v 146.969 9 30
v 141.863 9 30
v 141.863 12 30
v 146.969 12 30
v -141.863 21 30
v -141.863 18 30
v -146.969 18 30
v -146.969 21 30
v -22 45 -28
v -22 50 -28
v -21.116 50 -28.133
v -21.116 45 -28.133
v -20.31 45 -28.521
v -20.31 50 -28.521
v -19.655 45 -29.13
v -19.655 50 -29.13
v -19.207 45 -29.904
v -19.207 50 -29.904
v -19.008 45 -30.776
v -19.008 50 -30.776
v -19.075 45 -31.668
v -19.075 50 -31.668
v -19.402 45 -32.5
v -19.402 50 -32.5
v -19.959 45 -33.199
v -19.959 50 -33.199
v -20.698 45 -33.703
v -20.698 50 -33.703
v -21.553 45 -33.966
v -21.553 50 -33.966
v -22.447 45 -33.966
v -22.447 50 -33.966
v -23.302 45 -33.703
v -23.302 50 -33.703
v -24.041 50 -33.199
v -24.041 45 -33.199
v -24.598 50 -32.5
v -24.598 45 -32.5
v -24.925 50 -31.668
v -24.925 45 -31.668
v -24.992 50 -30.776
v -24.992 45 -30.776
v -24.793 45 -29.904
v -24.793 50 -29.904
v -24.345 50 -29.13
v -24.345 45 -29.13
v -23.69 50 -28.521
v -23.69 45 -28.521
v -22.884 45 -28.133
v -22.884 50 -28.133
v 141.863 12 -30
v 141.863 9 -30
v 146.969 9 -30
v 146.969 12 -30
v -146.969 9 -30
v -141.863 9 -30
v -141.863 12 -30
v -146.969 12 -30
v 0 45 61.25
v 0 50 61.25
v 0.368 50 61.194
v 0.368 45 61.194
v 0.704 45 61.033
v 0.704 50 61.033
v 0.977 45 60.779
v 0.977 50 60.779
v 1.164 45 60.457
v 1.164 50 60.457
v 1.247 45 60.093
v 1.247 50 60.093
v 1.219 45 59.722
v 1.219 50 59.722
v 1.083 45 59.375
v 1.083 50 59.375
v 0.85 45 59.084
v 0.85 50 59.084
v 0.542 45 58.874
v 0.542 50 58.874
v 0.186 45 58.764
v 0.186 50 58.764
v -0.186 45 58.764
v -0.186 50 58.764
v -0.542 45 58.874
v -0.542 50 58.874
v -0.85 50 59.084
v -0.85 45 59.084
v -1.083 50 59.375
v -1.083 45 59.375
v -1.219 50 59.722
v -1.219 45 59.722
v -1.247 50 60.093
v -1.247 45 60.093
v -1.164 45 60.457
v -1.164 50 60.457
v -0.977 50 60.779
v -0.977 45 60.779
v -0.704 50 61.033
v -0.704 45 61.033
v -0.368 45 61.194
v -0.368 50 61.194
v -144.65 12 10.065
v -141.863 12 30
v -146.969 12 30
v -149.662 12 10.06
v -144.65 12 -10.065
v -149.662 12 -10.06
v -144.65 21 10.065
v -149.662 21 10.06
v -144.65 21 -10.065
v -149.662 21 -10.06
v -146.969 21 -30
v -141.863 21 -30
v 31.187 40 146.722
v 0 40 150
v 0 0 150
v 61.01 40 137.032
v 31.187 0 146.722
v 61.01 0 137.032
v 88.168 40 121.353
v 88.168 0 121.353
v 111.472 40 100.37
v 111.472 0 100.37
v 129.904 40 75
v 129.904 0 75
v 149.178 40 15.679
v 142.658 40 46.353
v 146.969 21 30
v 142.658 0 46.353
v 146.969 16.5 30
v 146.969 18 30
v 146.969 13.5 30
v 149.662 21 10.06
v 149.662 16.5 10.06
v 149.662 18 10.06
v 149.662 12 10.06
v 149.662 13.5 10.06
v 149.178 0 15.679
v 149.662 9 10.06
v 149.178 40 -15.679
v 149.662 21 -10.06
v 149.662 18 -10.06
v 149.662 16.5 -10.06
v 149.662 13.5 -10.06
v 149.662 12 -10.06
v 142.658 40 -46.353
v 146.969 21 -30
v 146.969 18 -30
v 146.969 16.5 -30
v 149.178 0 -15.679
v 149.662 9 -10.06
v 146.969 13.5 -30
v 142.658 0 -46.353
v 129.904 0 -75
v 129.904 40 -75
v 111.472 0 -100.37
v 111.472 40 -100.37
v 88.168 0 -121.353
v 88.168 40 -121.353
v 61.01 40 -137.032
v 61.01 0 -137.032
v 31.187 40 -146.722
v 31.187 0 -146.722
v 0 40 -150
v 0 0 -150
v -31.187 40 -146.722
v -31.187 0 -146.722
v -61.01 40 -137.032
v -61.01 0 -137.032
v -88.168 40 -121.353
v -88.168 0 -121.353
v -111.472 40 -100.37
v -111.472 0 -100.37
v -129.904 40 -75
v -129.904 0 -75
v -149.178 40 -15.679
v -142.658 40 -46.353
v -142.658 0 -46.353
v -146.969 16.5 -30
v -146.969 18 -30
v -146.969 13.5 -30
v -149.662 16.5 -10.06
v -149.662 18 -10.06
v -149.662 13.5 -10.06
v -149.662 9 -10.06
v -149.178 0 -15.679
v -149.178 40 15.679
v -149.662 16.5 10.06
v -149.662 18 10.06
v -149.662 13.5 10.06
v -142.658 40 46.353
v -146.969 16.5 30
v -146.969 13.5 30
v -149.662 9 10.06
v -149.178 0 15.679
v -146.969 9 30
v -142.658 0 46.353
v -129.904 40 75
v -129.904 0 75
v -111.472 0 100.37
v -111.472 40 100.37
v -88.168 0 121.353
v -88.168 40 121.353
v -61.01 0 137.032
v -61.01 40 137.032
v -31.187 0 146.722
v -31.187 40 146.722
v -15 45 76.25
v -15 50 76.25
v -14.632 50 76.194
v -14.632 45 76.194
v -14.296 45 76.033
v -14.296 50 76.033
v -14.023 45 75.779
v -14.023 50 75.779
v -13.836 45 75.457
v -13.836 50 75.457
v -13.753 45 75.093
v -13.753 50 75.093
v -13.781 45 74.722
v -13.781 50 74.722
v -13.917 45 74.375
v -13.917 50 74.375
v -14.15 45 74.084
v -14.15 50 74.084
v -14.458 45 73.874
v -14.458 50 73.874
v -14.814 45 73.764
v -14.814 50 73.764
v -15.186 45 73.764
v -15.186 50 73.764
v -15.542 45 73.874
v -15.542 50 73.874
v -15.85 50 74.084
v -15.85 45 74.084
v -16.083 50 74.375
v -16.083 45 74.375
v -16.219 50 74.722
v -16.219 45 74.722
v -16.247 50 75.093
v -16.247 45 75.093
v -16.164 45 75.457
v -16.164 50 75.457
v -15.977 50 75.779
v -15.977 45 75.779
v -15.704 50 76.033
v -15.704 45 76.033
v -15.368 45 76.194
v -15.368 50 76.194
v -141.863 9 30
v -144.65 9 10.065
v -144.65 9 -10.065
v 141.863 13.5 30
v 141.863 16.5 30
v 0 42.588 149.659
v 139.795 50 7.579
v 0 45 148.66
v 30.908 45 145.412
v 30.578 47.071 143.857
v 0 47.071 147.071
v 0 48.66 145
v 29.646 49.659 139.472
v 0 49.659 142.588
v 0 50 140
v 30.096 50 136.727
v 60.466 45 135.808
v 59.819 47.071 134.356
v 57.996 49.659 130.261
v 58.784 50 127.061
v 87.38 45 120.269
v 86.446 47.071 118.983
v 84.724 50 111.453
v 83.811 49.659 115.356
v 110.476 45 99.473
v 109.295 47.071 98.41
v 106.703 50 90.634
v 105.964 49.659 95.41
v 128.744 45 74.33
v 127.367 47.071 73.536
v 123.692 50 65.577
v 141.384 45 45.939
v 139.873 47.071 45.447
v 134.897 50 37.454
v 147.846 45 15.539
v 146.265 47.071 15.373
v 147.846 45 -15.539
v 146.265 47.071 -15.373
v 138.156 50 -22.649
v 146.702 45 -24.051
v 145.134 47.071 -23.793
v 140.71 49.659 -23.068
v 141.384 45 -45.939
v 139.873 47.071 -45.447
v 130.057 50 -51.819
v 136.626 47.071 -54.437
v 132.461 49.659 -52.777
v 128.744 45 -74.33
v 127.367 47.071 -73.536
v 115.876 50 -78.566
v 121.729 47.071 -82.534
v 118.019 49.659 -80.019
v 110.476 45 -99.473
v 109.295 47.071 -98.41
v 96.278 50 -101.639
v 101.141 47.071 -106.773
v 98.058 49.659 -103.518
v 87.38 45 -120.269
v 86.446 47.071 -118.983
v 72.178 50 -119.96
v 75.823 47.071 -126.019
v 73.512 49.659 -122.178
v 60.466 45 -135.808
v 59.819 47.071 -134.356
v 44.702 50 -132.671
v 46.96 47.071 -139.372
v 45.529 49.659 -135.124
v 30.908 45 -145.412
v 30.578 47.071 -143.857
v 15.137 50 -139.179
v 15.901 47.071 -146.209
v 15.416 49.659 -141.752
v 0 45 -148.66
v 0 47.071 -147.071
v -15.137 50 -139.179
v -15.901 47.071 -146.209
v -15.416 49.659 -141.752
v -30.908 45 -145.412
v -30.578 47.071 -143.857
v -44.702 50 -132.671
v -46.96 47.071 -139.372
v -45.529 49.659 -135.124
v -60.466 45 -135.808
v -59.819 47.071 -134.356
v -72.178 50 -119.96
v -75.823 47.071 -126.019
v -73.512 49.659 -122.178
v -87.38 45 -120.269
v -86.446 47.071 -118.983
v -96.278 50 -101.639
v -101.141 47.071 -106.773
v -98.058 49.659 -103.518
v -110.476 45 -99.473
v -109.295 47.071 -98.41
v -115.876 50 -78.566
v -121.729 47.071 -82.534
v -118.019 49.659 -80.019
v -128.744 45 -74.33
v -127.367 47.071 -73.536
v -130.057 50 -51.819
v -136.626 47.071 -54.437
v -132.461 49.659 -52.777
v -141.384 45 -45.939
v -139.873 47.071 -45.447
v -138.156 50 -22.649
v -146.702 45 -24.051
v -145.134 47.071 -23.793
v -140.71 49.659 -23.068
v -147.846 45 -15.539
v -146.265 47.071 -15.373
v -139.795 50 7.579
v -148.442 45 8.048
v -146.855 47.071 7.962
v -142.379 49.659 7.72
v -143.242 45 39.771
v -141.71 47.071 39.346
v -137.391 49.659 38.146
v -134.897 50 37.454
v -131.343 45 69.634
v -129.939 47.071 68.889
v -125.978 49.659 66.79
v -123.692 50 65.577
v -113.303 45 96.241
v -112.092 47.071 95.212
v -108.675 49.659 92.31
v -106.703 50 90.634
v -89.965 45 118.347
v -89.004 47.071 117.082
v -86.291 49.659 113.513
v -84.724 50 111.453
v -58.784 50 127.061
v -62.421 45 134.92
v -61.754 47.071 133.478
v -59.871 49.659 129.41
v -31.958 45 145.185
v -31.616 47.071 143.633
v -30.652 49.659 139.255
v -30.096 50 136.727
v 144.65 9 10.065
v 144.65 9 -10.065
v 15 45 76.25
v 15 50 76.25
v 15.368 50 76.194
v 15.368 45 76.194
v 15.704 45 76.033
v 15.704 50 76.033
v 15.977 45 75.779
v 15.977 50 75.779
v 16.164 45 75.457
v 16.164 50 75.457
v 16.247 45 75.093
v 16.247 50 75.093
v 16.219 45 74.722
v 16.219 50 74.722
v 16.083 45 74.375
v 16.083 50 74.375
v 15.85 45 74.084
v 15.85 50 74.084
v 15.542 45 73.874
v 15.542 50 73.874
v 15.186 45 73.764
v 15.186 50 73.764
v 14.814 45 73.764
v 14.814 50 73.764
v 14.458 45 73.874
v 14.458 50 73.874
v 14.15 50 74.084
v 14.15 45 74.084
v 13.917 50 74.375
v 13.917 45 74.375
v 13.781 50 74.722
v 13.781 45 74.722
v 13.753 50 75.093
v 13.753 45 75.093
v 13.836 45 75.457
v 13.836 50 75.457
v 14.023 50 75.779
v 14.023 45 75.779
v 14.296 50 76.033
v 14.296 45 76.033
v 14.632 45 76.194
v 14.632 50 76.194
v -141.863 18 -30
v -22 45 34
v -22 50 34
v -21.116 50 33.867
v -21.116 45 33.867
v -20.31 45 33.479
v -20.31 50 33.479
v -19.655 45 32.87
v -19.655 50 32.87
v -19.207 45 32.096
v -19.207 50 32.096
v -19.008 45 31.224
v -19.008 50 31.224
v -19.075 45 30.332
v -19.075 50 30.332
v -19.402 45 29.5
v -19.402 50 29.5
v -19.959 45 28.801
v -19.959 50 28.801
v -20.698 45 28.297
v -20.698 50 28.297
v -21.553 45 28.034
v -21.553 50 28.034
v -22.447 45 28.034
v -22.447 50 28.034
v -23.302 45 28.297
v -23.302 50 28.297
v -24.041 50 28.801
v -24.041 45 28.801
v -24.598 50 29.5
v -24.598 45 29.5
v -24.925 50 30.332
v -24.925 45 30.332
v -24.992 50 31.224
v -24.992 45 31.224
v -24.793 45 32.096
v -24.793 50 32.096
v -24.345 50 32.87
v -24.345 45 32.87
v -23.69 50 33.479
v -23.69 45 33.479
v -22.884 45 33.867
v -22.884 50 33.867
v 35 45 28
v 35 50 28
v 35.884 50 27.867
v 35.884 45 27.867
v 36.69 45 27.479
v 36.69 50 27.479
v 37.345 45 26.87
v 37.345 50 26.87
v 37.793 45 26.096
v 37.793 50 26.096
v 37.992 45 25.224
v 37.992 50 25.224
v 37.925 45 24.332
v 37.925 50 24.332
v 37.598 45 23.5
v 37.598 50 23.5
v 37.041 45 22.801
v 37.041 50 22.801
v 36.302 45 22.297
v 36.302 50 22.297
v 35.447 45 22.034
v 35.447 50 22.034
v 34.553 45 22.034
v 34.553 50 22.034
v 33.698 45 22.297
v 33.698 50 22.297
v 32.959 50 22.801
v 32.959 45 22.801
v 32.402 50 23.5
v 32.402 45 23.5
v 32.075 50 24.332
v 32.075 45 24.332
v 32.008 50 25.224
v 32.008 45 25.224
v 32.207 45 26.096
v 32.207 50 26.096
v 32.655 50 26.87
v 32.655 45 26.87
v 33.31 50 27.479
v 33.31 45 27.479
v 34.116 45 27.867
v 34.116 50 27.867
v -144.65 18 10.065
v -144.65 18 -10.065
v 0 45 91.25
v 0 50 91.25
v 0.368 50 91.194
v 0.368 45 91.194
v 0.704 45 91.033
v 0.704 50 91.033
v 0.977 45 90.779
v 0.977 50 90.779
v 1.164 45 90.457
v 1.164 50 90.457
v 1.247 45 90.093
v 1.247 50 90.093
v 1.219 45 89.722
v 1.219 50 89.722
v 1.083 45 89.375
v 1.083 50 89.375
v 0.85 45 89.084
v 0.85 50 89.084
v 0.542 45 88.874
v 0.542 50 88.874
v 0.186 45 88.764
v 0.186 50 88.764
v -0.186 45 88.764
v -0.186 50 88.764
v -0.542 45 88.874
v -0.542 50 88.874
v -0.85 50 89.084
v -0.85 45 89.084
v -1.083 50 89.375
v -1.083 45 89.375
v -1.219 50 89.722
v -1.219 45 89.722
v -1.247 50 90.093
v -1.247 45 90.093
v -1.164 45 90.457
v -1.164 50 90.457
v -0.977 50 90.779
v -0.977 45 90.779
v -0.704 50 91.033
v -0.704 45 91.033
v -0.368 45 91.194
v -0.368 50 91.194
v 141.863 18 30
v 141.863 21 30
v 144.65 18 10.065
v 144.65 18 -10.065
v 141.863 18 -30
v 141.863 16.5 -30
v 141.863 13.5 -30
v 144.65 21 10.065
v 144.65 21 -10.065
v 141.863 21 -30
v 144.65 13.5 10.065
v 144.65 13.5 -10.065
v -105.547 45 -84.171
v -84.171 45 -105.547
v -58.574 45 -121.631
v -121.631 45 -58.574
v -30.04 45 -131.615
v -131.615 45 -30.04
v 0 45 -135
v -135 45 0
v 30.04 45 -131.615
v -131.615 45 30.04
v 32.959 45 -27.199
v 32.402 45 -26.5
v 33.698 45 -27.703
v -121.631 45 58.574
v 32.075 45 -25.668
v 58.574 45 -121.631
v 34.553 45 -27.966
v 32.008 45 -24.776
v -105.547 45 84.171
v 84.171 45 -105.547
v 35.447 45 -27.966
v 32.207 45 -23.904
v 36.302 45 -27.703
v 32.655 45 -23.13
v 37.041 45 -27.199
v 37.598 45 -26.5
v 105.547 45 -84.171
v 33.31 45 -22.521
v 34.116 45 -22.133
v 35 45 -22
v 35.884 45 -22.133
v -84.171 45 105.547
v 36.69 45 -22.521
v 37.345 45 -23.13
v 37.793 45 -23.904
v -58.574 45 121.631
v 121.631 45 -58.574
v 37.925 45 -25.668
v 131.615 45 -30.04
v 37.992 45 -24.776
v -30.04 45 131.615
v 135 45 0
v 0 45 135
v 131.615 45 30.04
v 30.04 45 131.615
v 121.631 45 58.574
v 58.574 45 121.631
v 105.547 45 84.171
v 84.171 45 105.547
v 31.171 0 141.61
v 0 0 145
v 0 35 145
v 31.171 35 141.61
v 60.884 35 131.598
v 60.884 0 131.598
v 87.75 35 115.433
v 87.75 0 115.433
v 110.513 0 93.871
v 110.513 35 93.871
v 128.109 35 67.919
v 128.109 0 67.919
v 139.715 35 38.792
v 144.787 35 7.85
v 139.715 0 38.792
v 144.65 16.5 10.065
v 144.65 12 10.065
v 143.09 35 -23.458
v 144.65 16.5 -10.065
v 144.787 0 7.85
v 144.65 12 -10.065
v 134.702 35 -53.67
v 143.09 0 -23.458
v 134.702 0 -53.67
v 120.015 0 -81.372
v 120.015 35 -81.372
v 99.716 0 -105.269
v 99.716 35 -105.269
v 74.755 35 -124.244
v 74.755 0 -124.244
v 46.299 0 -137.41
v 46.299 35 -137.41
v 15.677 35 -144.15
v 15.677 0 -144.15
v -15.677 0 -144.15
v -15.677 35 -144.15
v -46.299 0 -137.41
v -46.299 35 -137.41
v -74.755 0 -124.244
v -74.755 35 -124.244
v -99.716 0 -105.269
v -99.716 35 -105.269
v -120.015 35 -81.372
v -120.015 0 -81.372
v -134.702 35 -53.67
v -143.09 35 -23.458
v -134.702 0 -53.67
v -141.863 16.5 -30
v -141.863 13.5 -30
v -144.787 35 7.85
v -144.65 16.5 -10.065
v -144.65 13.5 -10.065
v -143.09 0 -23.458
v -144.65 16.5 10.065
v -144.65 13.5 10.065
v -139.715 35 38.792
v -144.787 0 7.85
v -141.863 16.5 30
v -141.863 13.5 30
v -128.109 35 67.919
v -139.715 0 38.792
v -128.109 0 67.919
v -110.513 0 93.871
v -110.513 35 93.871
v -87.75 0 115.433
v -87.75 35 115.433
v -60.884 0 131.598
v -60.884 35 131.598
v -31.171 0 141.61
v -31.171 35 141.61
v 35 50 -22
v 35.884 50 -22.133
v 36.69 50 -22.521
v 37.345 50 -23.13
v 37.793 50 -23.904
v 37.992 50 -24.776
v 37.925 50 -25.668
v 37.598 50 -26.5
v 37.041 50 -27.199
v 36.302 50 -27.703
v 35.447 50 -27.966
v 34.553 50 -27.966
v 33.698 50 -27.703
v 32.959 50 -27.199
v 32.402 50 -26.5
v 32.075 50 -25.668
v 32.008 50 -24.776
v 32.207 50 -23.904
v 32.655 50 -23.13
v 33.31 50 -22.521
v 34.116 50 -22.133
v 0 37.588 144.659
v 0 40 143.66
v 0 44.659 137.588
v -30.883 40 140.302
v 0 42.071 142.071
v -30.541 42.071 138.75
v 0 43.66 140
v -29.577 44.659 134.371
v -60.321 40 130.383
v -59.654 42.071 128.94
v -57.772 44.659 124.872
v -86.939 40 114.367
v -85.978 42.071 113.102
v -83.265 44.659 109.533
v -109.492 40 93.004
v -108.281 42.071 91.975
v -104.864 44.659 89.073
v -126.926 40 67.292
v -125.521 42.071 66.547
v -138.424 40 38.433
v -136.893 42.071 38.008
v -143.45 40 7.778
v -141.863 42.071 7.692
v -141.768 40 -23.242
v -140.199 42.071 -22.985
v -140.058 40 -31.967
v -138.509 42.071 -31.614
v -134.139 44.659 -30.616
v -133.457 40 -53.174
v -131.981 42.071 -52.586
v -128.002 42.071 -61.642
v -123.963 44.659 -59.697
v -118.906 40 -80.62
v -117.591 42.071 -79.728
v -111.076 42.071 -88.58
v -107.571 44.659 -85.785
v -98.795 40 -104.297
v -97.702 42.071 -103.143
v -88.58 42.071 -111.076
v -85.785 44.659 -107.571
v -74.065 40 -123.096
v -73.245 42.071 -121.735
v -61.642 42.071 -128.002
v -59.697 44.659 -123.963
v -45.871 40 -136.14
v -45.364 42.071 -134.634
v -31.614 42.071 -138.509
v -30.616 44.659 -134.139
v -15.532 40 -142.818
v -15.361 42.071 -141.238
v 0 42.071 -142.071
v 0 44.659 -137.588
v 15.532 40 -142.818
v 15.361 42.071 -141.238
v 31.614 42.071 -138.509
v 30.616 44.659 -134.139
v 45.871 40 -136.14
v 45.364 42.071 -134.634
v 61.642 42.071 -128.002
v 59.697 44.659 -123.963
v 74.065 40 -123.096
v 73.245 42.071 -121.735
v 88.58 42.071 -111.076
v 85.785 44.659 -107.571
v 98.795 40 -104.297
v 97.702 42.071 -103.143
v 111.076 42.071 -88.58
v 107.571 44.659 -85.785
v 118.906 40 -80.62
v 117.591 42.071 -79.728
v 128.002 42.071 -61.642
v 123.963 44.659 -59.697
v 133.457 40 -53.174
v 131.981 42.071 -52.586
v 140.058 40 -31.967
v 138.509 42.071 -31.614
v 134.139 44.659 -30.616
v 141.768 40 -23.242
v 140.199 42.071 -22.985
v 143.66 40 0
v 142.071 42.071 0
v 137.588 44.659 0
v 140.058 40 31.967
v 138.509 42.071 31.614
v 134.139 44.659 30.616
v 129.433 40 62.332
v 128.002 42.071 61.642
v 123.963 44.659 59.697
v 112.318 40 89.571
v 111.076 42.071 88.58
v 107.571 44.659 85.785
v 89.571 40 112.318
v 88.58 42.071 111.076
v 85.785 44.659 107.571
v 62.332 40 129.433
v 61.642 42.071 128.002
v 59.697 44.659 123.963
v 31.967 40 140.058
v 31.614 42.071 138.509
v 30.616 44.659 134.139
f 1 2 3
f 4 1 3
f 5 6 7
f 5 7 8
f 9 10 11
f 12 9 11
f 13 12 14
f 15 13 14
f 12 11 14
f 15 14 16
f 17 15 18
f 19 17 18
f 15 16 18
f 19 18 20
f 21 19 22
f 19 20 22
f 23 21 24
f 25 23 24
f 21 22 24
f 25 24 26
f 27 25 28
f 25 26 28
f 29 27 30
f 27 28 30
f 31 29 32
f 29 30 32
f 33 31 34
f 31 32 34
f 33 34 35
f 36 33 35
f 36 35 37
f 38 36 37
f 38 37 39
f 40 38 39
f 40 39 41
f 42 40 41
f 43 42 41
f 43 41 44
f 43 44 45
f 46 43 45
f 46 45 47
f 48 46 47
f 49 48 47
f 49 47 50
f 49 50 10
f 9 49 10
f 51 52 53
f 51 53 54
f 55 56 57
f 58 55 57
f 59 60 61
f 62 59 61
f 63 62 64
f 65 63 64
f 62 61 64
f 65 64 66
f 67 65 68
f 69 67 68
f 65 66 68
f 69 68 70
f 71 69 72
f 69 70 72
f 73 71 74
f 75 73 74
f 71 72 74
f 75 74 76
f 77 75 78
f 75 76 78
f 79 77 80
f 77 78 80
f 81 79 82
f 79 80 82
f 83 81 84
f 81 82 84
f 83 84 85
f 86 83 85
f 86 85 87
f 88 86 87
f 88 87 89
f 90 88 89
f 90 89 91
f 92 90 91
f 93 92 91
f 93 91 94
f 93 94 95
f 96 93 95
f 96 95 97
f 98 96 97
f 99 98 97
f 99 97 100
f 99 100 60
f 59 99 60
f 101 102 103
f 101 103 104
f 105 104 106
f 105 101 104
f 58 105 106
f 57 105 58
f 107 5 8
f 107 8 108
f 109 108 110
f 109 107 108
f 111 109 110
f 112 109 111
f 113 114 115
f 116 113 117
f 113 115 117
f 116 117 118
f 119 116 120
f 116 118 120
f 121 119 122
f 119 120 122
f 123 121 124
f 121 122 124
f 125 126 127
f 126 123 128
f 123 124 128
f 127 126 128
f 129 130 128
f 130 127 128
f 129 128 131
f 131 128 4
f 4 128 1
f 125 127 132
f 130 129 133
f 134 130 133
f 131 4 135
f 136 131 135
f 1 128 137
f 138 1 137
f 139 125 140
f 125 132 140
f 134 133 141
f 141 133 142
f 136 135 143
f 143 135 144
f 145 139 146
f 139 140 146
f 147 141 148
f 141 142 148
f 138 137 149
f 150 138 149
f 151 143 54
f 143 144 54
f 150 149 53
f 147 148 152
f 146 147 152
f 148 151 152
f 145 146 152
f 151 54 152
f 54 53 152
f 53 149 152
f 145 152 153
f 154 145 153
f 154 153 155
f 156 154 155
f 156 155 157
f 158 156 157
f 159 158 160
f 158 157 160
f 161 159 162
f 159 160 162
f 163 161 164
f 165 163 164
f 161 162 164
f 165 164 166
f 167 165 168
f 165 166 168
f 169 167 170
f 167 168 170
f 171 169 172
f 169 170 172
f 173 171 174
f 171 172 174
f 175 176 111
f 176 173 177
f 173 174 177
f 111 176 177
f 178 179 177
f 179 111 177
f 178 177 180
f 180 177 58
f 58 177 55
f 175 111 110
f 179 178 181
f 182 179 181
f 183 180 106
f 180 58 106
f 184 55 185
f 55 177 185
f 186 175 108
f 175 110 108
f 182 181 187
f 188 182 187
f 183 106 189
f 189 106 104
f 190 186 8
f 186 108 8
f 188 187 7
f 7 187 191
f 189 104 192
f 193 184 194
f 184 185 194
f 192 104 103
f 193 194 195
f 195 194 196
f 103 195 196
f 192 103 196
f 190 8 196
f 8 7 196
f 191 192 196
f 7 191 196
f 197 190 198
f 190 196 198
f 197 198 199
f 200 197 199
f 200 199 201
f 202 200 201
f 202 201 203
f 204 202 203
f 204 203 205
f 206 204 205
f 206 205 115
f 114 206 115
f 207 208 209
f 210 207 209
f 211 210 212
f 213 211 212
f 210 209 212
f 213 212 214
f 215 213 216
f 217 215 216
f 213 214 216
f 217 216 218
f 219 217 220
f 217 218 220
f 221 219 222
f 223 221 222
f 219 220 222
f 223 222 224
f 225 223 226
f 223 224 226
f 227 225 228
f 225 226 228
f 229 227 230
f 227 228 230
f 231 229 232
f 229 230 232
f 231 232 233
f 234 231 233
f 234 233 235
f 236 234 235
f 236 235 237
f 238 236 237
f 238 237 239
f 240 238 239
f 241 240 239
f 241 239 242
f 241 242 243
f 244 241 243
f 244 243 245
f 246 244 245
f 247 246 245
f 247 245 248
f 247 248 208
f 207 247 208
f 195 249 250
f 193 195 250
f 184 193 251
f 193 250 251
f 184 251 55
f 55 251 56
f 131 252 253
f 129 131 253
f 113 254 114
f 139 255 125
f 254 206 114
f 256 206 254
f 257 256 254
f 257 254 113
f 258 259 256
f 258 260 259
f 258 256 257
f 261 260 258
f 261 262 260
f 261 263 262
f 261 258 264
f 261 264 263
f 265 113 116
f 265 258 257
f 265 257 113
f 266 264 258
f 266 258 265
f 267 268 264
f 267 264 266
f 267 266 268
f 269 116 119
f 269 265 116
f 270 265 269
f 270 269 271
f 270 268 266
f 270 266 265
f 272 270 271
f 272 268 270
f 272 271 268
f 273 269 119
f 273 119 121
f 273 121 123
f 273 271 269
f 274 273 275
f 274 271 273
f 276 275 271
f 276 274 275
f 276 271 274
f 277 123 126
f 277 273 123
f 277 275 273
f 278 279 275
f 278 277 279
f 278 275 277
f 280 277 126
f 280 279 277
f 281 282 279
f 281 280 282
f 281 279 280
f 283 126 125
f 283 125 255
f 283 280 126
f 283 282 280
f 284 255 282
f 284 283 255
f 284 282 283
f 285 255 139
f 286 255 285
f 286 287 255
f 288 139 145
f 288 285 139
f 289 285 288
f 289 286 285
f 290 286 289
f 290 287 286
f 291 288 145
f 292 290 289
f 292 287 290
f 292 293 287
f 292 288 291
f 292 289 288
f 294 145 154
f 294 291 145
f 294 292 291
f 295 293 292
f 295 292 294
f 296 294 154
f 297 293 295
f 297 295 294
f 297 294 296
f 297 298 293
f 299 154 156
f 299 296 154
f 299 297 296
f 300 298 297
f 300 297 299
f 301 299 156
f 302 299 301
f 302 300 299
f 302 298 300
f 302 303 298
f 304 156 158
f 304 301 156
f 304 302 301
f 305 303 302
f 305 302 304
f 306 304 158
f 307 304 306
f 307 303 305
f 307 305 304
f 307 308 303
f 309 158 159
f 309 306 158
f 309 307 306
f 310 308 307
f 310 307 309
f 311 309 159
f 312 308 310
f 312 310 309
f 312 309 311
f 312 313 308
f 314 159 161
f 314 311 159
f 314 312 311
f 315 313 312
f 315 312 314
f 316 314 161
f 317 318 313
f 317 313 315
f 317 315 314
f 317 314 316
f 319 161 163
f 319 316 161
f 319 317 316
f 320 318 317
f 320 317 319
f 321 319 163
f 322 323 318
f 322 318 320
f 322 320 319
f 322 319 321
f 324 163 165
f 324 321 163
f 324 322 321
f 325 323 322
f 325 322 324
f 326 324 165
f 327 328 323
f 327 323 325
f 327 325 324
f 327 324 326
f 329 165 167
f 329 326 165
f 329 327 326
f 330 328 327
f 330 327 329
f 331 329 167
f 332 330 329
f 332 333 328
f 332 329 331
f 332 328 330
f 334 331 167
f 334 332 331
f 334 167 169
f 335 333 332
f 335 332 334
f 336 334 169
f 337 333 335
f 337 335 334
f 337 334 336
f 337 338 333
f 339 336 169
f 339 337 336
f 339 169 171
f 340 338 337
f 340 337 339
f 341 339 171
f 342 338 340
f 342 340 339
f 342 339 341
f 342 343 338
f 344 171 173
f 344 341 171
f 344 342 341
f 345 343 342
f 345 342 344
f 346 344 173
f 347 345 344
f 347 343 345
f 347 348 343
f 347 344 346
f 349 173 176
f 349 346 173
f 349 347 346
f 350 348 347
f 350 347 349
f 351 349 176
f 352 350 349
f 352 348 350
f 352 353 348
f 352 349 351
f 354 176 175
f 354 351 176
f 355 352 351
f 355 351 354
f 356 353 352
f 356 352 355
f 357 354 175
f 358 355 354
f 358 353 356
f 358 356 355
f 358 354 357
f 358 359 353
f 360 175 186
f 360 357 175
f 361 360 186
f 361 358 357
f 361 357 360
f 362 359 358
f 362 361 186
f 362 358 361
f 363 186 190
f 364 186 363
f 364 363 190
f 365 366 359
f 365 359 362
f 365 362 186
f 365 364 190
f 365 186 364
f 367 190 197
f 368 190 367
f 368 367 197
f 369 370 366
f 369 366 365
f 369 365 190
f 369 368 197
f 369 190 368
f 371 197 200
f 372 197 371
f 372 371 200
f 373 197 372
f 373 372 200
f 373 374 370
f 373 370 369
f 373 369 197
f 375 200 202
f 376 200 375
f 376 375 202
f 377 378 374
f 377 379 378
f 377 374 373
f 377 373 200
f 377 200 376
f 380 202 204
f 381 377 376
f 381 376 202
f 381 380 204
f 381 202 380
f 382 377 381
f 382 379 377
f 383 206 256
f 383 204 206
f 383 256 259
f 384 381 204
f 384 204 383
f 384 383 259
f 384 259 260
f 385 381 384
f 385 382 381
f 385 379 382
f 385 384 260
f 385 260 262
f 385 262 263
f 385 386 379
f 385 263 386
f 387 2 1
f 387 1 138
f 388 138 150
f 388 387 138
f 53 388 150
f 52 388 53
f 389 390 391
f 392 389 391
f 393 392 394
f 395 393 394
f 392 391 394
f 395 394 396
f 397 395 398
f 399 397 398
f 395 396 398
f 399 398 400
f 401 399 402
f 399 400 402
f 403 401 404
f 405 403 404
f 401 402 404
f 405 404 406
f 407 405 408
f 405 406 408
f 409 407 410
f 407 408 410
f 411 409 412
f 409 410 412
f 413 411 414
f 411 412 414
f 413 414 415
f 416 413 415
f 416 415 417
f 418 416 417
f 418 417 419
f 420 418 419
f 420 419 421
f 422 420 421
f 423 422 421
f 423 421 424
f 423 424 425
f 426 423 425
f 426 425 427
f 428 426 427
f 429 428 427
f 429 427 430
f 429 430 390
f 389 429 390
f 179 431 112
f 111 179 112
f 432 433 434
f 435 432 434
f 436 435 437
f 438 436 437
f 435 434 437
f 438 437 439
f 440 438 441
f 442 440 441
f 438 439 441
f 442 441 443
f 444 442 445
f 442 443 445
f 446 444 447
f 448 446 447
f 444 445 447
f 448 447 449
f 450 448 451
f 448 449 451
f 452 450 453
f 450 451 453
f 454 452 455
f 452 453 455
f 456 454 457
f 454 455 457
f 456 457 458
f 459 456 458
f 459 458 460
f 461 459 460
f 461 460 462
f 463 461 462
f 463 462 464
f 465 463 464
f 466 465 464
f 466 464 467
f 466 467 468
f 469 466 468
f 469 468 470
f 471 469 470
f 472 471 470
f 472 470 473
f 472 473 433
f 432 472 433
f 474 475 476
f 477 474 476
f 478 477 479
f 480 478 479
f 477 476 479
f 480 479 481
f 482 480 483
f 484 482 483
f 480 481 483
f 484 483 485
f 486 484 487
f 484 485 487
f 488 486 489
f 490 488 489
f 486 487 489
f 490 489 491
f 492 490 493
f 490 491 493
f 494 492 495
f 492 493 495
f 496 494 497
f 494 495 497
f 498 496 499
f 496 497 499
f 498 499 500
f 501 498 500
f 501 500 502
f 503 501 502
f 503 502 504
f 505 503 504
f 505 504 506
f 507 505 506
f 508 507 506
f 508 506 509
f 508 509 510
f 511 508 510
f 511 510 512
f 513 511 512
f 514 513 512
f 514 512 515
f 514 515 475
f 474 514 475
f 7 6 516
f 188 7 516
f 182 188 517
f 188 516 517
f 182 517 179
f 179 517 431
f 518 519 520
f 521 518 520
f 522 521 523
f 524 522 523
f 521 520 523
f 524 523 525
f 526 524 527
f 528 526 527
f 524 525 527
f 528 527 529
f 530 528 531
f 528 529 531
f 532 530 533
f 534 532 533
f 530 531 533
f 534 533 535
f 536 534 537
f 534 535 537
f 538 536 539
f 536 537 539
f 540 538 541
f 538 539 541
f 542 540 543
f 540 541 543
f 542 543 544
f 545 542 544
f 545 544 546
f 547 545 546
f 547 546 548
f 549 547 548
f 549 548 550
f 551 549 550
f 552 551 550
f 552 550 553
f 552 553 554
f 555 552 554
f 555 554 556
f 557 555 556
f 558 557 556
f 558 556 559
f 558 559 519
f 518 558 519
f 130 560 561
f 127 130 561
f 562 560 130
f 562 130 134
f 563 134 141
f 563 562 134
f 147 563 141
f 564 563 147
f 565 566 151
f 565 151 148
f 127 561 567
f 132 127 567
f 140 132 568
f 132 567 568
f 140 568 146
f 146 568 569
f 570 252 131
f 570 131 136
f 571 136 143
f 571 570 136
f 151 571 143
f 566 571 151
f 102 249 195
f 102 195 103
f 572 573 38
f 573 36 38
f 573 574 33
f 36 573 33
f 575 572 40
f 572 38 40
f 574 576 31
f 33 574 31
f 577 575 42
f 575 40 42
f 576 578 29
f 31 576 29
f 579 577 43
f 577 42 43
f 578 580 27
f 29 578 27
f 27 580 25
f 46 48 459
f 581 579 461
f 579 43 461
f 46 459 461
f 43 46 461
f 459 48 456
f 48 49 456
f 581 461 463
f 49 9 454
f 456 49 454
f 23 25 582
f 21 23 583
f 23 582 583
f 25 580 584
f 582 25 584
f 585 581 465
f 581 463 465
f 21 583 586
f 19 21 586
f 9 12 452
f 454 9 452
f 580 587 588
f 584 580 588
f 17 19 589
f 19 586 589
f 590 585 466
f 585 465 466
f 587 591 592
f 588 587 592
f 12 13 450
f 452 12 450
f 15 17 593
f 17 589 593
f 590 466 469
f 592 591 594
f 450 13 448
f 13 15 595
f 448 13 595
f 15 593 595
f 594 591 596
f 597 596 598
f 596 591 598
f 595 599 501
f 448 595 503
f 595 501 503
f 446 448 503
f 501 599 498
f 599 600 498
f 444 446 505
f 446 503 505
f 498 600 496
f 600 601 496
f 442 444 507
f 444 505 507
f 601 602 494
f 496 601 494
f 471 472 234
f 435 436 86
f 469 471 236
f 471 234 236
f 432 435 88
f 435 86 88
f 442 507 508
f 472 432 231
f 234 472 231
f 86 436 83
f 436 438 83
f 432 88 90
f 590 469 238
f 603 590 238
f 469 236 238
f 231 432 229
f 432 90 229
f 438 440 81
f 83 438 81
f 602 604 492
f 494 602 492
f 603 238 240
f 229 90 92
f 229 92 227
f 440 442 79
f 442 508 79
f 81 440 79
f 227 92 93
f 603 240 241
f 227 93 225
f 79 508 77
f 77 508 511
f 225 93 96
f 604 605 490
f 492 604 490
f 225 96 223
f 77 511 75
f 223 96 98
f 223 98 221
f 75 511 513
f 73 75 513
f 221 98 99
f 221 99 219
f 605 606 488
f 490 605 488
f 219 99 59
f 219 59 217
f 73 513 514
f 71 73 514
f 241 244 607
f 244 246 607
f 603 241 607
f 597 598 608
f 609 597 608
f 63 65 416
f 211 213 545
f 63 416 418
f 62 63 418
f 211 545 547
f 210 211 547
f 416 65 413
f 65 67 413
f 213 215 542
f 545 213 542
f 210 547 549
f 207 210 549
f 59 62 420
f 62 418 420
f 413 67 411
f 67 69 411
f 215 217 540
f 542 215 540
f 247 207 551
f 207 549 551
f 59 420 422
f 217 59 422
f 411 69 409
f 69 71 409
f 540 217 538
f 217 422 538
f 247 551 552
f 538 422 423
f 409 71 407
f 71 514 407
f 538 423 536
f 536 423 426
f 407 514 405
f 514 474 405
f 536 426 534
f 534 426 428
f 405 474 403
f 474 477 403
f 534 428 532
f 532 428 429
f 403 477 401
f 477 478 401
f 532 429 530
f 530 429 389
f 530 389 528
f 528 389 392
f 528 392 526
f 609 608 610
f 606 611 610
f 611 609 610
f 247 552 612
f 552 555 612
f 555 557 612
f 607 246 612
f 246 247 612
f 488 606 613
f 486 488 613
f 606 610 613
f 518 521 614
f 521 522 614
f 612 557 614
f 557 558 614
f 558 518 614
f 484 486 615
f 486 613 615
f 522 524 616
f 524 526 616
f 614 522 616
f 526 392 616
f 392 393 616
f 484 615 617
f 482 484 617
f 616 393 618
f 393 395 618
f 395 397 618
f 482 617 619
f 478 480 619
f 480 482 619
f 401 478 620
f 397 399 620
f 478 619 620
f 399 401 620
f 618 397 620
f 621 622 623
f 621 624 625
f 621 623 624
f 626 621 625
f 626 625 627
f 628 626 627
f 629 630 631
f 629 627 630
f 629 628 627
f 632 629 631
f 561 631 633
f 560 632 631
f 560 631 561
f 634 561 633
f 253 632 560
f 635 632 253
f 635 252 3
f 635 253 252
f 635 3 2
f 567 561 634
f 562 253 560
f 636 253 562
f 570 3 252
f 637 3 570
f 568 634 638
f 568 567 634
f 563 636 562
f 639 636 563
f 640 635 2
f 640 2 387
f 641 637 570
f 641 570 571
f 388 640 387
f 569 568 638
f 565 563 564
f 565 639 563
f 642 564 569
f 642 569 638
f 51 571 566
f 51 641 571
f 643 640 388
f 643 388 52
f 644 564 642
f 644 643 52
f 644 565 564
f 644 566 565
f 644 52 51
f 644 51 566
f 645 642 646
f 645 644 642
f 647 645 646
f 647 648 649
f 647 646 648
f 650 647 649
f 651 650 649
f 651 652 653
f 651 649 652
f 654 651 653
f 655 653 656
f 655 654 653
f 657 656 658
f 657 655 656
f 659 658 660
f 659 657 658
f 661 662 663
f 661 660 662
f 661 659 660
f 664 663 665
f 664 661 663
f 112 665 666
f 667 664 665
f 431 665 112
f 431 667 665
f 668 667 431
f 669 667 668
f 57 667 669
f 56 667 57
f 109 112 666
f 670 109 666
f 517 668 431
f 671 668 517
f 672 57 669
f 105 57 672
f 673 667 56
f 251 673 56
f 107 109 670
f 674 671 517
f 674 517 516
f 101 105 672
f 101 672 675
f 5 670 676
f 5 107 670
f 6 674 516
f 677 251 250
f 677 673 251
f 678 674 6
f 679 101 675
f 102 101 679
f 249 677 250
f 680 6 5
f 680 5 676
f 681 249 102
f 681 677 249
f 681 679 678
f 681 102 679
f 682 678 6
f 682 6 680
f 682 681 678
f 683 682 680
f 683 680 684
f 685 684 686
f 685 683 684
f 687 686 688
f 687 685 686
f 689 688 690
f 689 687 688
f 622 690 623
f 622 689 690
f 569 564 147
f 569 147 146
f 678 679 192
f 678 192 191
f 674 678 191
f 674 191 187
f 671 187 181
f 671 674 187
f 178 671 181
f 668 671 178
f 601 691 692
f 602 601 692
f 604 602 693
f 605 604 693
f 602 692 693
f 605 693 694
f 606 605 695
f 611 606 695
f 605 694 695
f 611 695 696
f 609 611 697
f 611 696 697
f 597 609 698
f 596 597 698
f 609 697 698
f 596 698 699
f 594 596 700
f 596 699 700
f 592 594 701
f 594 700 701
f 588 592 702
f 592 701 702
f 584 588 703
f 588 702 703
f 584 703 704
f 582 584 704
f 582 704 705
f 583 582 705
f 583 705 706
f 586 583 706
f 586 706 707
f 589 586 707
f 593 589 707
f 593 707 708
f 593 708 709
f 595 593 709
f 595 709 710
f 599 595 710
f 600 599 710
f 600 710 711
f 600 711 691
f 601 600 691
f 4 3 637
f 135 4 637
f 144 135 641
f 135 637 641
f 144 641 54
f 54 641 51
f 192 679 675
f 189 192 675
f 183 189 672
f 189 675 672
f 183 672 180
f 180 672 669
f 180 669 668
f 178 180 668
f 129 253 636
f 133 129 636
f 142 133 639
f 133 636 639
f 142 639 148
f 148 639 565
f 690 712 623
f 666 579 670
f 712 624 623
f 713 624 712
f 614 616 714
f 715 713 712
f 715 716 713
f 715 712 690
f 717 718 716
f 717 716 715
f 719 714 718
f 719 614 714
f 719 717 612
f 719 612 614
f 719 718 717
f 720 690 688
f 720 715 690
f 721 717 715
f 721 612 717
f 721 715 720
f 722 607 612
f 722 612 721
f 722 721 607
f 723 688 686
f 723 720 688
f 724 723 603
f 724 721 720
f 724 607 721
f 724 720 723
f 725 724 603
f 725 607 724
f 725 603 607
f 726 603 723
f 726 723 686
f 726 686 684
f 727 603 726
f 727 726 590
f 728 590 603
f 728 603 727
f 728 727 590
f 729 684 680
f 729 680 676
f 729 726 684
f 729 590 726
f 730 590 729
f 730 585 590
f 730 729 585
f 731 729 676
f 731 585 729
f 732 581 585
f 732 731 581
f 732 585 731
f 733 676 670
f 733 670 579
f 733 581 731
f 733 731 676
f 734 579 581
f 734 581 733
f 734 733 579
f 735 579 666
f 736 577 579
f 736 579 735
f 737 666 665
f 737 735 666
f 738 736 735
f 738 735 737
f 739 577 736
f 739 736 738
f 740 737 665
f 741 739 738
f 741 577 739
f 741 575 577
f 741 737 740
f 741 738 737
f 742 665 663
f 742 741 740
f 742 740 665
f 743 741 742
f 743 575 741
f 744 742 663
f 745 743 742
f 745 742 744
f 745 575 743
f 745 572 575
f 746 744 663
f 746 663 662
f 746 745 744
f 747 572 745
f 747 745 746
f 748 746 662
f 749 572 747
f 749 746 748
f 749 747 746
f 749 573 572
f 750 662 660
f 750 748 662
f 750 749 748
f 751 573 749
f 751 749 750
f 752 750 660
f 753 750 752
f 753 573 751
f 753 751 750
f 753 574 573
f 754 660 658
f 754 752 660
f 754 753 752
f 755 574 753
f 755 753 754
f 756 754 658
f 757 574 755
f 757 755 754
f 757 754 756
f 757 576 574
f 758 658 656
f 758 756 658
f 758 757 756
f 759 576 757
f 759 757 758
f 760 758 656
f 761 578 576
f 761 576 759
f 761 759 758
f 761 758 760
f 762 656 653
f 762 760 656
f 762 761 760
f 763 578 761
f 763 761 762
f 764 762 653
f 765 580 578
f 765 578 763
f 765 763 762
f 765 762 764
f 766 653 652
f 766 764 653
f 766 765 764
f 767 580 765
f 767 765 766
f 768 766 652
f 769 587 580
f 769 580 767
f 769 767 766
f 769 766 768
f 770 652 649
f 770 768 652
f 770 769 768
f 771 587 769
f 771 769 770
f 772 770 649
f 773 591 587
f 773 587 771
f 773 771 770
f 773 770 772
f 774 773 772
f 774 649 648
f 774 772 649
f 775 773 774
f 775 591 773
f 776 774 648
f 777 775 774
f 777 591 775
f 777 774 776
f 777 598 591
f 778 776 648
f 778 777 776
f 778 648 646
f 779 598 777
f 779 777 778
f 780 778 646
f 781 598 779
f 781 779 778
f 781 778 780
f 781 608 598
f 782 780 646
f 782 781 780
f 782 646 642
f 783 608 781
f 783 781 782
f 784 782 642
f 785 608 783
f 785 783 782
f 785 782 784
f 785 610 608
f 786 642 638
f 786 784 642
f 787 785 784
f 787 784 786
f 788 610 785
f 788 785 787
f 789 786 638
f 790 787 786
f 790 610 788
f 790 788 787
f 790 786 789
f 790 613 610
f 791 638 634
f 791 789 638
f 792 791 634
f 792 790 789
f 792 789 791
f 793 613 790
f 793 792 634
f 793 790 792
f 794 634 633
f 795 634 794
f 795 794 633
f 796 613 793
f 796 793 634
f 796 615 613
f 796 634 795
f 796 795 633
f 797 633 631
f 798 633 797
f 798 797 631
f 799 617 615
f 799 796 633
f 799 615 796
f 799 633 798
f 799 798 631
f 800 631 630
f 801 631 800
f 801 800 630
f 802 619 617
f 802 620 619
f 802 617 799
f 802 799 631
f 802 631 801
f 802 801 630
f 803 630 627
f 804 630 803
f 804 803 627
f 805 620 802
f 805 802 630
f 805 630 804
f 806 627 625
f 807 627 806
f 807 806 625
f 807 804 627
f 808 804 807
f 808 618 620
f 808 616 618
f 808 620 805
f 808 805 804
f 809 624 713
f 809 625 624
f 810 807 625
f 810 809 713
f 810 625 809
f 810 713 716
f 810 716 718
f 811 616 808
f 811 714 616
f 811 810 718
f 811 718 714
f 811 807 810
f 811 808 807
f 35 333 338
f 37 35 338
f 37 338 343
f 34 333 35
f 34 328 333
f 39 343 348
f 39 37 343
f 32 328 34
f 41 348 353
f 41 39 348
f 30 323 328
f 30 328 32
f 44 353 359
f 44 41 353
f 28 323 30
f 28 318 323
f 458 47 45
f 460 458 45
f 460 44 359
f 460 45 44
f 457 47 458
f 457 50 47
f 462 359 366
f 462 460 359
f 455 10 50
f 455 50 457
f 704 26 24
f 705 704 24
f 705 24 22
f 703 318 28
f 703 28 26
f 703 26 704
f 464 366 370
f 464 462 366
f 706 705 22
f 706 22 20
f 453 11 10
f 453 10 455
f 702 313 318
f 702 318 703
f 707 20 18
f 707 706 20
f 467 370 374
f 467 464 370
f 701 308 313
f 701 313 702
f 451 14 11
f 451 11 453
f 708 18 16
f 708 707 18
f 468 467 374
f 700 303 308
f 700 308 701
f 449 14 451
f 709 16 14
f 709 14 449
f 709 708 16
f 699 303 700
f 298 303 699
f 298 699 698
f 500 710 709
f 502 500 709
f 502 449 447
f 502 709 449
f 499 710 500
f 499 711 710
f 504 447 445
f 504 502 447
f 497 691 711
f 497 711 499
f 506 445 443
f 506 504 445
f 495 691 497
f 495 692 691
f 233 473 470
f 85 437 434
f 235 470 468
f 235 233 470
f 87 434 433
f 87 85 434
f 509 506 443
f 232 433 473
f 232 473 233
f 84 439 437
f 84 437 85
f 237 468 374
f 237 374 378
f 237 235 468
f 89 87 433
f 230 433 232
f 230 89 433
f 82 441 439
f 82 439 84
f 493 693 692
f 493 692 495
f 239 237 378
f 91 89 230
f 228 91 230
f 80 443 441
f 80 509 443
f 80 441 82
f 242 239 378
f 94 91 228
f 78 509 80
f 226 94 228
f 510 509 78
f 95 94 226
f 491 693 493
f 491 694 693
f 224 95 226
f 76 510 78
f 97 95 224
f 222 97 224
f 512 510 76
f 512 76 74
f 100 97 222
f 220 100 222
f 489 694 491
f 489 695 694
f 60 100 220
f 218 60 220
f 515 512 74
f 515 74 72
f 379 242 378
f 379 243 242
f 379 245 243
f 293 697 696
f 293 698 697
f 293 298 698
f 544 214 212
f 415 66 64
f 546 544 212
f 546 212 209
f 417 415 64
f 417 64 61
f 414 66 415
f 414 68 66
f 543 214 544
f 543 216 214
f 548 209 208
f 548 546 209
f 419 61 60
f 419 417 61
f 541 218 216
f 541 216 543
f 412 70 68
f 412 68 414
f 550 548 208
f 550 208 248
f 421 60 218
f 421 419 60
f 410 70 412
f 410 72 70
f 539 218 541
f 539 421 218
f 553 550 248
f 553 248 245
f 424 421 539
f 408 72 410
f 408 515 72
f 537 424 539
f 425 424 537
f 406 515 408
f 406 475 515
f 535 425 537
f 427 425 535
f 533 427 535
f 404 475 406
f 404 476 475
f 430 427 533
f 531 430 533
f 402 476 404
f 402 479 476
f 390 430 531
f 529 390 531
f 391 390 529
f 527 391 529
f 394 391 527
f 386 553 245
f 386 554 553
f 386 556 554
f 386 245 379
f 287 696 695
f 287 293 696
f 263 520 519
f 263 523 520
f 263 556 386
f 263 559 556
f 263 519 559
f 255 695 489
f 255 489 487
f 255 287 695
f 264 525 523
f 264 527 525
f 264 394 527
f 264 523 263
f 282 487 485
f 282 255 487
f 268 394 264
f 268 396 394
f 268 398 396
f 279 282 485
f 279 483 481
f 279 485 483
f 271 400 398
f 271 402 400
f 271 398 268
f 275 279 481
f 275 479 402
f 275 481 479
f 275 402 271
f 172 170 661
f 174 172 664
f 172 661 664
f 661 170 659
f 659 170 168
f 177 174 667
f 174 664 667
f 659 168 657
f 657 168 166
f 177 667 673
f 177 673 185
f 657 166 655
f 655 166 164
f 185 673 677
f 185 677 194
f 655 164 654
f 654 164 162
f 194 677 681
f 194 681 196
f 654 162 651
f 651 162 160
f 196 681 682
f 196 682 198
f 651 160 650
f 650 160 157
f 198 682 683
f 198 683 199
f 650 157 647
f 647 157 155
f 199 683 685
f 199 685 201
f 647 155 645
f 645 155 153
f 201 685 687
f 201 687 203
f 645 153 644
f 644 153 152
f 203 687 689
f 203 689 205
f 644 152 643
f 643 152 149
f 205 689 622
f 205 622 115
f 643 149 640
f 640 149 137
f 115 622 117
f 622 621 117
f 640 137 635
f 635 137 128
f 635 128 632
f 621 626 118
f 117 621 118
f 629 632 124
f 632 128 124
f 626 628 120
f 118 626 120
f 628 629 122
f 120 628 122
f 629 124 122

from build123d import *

# Parameters (mm, degrees)
SKETCH1_R               = 150
BOSS_EXTRUDE1_DEPTH     = 50
SHELL2_T                = -5
FILLET1_R               = 10
SKETCH4_R               = 3
SKETCH4_R_2             = 1.25
CUT_EXTRUDE2_DEPTH      = 218.944947177
CUT_EXTRUDE2_DEPTH_BACK = 218.944947177
SKETCH5_W               = 60
SKETCH5_H               = 3
CUT_EXTRUDE3_DEPTH      = 218.944947177
CUT_EXTRUDE3_DEPTH_BACK = 218.944947177


with BuildPart() as part:
    # Sketch1 → Boss-Extrude1 (new body)
    with BuildSketch(Plane(origin=(0, 0, 0), x_dir=(1, 0, 0), z_dir=(0, 1, 0))):
        with Locations(Location((0, 0, 0), (0, 0, 270))):
            Circle(SKETCH1_R)
    extrude(amount=BOSS_EXTRUDE1_DEPTH)

    # Shell2
    shell2_openings = [part.faces().sort_by_distance(p)[0] for p in [
        (0, 0, 0),
    ]]
    offset(amount=SHELL2_T, openings=shell2_openings, kind=Kind.INTERSECTION)

    # Fillet1
    fillet1_edges = [part.edges().sort_by_distance(p)[0] for p in [
        (0, 50, -150),
        (0, 45, -145),
    ]]
    fillet(fillet1_edges, radius=FILLET1_R)

    # Sketch4 → Cut-Extrude2 (cut, two sides)
    with BuildSketch(Plane(origin=(0, 50, 0), x_dir=(1, 0, 0), z_dir=(0, 1, 0))) as cut_extrude2_sk:
        with Locations(Location((-22, 31, 0), (0, 0, 270))):
            Circle(SKETCH4_R)
        with Locations(Location((35, 25, 0), (0, 0, 270))):
            Circle(SKETCH4_R)
        with Locations(Location((-22, -31, 0), (0, 0, 270))):
            Circle(SKETCH4_R)
        with Locations(Location((35, -25, 0), (0, 0, 270))):
            Circle(SKETCH4_R)
        with Locations(Location((0, -60, 0), (0, 0, 270))):
            Circle(SKETCH4_R_2)
        with Locations(Location((-15, -75, 0), (0, 0, 270))):
            Circle(SKETCH4_R_2)
        with Locations(Location((0, -90, 0), (0, 0, 270))):
            Circle(SKETCH4_R_2)
        with Locations(Location((15, -75, 0), (0, 0, 270))):
            Circle(SKETCH4_R_2)
    extrude(amount=CUT_EXTRUDE2_DEPTH, mode=Mode.SUBTRACT)
    extrude(cut_extrude2_sk.sketch, amount=-CUT_EXTRUDE2_DEPTH_BACK, mode=Mode.SUBTRACT)

    # Sketch5 → Cut-Extrude3 (cut, two sides)
    with BuildSketch(Plane(origin=(0, 0, 0), x_dir=(0, 0, -1), z_dir=(1, 0, 0))) as cut_extrude3_sk:
        with Locations((0, 15)):
            Rectangle(SKETCH5_W, SKETCH5_H)
        with Locations((0, 10.5)):
            Rectangle(SKETCH5_W, SKETCH5_H)
        with Locations((0, 19.5)):
            Rectangle(SKETCH5_W, SKETCH5_H)
    extrude(amount=CUT_EXTRUDE3_DEPTH, mode=Mode.SUBTRACT)
    extrude(cut_extrude3_sk.sketch, amount=-CUT_EXTRUDE3_DEPTH_BACK, mode=Mode.SUBTRACT)


solid = part.part
